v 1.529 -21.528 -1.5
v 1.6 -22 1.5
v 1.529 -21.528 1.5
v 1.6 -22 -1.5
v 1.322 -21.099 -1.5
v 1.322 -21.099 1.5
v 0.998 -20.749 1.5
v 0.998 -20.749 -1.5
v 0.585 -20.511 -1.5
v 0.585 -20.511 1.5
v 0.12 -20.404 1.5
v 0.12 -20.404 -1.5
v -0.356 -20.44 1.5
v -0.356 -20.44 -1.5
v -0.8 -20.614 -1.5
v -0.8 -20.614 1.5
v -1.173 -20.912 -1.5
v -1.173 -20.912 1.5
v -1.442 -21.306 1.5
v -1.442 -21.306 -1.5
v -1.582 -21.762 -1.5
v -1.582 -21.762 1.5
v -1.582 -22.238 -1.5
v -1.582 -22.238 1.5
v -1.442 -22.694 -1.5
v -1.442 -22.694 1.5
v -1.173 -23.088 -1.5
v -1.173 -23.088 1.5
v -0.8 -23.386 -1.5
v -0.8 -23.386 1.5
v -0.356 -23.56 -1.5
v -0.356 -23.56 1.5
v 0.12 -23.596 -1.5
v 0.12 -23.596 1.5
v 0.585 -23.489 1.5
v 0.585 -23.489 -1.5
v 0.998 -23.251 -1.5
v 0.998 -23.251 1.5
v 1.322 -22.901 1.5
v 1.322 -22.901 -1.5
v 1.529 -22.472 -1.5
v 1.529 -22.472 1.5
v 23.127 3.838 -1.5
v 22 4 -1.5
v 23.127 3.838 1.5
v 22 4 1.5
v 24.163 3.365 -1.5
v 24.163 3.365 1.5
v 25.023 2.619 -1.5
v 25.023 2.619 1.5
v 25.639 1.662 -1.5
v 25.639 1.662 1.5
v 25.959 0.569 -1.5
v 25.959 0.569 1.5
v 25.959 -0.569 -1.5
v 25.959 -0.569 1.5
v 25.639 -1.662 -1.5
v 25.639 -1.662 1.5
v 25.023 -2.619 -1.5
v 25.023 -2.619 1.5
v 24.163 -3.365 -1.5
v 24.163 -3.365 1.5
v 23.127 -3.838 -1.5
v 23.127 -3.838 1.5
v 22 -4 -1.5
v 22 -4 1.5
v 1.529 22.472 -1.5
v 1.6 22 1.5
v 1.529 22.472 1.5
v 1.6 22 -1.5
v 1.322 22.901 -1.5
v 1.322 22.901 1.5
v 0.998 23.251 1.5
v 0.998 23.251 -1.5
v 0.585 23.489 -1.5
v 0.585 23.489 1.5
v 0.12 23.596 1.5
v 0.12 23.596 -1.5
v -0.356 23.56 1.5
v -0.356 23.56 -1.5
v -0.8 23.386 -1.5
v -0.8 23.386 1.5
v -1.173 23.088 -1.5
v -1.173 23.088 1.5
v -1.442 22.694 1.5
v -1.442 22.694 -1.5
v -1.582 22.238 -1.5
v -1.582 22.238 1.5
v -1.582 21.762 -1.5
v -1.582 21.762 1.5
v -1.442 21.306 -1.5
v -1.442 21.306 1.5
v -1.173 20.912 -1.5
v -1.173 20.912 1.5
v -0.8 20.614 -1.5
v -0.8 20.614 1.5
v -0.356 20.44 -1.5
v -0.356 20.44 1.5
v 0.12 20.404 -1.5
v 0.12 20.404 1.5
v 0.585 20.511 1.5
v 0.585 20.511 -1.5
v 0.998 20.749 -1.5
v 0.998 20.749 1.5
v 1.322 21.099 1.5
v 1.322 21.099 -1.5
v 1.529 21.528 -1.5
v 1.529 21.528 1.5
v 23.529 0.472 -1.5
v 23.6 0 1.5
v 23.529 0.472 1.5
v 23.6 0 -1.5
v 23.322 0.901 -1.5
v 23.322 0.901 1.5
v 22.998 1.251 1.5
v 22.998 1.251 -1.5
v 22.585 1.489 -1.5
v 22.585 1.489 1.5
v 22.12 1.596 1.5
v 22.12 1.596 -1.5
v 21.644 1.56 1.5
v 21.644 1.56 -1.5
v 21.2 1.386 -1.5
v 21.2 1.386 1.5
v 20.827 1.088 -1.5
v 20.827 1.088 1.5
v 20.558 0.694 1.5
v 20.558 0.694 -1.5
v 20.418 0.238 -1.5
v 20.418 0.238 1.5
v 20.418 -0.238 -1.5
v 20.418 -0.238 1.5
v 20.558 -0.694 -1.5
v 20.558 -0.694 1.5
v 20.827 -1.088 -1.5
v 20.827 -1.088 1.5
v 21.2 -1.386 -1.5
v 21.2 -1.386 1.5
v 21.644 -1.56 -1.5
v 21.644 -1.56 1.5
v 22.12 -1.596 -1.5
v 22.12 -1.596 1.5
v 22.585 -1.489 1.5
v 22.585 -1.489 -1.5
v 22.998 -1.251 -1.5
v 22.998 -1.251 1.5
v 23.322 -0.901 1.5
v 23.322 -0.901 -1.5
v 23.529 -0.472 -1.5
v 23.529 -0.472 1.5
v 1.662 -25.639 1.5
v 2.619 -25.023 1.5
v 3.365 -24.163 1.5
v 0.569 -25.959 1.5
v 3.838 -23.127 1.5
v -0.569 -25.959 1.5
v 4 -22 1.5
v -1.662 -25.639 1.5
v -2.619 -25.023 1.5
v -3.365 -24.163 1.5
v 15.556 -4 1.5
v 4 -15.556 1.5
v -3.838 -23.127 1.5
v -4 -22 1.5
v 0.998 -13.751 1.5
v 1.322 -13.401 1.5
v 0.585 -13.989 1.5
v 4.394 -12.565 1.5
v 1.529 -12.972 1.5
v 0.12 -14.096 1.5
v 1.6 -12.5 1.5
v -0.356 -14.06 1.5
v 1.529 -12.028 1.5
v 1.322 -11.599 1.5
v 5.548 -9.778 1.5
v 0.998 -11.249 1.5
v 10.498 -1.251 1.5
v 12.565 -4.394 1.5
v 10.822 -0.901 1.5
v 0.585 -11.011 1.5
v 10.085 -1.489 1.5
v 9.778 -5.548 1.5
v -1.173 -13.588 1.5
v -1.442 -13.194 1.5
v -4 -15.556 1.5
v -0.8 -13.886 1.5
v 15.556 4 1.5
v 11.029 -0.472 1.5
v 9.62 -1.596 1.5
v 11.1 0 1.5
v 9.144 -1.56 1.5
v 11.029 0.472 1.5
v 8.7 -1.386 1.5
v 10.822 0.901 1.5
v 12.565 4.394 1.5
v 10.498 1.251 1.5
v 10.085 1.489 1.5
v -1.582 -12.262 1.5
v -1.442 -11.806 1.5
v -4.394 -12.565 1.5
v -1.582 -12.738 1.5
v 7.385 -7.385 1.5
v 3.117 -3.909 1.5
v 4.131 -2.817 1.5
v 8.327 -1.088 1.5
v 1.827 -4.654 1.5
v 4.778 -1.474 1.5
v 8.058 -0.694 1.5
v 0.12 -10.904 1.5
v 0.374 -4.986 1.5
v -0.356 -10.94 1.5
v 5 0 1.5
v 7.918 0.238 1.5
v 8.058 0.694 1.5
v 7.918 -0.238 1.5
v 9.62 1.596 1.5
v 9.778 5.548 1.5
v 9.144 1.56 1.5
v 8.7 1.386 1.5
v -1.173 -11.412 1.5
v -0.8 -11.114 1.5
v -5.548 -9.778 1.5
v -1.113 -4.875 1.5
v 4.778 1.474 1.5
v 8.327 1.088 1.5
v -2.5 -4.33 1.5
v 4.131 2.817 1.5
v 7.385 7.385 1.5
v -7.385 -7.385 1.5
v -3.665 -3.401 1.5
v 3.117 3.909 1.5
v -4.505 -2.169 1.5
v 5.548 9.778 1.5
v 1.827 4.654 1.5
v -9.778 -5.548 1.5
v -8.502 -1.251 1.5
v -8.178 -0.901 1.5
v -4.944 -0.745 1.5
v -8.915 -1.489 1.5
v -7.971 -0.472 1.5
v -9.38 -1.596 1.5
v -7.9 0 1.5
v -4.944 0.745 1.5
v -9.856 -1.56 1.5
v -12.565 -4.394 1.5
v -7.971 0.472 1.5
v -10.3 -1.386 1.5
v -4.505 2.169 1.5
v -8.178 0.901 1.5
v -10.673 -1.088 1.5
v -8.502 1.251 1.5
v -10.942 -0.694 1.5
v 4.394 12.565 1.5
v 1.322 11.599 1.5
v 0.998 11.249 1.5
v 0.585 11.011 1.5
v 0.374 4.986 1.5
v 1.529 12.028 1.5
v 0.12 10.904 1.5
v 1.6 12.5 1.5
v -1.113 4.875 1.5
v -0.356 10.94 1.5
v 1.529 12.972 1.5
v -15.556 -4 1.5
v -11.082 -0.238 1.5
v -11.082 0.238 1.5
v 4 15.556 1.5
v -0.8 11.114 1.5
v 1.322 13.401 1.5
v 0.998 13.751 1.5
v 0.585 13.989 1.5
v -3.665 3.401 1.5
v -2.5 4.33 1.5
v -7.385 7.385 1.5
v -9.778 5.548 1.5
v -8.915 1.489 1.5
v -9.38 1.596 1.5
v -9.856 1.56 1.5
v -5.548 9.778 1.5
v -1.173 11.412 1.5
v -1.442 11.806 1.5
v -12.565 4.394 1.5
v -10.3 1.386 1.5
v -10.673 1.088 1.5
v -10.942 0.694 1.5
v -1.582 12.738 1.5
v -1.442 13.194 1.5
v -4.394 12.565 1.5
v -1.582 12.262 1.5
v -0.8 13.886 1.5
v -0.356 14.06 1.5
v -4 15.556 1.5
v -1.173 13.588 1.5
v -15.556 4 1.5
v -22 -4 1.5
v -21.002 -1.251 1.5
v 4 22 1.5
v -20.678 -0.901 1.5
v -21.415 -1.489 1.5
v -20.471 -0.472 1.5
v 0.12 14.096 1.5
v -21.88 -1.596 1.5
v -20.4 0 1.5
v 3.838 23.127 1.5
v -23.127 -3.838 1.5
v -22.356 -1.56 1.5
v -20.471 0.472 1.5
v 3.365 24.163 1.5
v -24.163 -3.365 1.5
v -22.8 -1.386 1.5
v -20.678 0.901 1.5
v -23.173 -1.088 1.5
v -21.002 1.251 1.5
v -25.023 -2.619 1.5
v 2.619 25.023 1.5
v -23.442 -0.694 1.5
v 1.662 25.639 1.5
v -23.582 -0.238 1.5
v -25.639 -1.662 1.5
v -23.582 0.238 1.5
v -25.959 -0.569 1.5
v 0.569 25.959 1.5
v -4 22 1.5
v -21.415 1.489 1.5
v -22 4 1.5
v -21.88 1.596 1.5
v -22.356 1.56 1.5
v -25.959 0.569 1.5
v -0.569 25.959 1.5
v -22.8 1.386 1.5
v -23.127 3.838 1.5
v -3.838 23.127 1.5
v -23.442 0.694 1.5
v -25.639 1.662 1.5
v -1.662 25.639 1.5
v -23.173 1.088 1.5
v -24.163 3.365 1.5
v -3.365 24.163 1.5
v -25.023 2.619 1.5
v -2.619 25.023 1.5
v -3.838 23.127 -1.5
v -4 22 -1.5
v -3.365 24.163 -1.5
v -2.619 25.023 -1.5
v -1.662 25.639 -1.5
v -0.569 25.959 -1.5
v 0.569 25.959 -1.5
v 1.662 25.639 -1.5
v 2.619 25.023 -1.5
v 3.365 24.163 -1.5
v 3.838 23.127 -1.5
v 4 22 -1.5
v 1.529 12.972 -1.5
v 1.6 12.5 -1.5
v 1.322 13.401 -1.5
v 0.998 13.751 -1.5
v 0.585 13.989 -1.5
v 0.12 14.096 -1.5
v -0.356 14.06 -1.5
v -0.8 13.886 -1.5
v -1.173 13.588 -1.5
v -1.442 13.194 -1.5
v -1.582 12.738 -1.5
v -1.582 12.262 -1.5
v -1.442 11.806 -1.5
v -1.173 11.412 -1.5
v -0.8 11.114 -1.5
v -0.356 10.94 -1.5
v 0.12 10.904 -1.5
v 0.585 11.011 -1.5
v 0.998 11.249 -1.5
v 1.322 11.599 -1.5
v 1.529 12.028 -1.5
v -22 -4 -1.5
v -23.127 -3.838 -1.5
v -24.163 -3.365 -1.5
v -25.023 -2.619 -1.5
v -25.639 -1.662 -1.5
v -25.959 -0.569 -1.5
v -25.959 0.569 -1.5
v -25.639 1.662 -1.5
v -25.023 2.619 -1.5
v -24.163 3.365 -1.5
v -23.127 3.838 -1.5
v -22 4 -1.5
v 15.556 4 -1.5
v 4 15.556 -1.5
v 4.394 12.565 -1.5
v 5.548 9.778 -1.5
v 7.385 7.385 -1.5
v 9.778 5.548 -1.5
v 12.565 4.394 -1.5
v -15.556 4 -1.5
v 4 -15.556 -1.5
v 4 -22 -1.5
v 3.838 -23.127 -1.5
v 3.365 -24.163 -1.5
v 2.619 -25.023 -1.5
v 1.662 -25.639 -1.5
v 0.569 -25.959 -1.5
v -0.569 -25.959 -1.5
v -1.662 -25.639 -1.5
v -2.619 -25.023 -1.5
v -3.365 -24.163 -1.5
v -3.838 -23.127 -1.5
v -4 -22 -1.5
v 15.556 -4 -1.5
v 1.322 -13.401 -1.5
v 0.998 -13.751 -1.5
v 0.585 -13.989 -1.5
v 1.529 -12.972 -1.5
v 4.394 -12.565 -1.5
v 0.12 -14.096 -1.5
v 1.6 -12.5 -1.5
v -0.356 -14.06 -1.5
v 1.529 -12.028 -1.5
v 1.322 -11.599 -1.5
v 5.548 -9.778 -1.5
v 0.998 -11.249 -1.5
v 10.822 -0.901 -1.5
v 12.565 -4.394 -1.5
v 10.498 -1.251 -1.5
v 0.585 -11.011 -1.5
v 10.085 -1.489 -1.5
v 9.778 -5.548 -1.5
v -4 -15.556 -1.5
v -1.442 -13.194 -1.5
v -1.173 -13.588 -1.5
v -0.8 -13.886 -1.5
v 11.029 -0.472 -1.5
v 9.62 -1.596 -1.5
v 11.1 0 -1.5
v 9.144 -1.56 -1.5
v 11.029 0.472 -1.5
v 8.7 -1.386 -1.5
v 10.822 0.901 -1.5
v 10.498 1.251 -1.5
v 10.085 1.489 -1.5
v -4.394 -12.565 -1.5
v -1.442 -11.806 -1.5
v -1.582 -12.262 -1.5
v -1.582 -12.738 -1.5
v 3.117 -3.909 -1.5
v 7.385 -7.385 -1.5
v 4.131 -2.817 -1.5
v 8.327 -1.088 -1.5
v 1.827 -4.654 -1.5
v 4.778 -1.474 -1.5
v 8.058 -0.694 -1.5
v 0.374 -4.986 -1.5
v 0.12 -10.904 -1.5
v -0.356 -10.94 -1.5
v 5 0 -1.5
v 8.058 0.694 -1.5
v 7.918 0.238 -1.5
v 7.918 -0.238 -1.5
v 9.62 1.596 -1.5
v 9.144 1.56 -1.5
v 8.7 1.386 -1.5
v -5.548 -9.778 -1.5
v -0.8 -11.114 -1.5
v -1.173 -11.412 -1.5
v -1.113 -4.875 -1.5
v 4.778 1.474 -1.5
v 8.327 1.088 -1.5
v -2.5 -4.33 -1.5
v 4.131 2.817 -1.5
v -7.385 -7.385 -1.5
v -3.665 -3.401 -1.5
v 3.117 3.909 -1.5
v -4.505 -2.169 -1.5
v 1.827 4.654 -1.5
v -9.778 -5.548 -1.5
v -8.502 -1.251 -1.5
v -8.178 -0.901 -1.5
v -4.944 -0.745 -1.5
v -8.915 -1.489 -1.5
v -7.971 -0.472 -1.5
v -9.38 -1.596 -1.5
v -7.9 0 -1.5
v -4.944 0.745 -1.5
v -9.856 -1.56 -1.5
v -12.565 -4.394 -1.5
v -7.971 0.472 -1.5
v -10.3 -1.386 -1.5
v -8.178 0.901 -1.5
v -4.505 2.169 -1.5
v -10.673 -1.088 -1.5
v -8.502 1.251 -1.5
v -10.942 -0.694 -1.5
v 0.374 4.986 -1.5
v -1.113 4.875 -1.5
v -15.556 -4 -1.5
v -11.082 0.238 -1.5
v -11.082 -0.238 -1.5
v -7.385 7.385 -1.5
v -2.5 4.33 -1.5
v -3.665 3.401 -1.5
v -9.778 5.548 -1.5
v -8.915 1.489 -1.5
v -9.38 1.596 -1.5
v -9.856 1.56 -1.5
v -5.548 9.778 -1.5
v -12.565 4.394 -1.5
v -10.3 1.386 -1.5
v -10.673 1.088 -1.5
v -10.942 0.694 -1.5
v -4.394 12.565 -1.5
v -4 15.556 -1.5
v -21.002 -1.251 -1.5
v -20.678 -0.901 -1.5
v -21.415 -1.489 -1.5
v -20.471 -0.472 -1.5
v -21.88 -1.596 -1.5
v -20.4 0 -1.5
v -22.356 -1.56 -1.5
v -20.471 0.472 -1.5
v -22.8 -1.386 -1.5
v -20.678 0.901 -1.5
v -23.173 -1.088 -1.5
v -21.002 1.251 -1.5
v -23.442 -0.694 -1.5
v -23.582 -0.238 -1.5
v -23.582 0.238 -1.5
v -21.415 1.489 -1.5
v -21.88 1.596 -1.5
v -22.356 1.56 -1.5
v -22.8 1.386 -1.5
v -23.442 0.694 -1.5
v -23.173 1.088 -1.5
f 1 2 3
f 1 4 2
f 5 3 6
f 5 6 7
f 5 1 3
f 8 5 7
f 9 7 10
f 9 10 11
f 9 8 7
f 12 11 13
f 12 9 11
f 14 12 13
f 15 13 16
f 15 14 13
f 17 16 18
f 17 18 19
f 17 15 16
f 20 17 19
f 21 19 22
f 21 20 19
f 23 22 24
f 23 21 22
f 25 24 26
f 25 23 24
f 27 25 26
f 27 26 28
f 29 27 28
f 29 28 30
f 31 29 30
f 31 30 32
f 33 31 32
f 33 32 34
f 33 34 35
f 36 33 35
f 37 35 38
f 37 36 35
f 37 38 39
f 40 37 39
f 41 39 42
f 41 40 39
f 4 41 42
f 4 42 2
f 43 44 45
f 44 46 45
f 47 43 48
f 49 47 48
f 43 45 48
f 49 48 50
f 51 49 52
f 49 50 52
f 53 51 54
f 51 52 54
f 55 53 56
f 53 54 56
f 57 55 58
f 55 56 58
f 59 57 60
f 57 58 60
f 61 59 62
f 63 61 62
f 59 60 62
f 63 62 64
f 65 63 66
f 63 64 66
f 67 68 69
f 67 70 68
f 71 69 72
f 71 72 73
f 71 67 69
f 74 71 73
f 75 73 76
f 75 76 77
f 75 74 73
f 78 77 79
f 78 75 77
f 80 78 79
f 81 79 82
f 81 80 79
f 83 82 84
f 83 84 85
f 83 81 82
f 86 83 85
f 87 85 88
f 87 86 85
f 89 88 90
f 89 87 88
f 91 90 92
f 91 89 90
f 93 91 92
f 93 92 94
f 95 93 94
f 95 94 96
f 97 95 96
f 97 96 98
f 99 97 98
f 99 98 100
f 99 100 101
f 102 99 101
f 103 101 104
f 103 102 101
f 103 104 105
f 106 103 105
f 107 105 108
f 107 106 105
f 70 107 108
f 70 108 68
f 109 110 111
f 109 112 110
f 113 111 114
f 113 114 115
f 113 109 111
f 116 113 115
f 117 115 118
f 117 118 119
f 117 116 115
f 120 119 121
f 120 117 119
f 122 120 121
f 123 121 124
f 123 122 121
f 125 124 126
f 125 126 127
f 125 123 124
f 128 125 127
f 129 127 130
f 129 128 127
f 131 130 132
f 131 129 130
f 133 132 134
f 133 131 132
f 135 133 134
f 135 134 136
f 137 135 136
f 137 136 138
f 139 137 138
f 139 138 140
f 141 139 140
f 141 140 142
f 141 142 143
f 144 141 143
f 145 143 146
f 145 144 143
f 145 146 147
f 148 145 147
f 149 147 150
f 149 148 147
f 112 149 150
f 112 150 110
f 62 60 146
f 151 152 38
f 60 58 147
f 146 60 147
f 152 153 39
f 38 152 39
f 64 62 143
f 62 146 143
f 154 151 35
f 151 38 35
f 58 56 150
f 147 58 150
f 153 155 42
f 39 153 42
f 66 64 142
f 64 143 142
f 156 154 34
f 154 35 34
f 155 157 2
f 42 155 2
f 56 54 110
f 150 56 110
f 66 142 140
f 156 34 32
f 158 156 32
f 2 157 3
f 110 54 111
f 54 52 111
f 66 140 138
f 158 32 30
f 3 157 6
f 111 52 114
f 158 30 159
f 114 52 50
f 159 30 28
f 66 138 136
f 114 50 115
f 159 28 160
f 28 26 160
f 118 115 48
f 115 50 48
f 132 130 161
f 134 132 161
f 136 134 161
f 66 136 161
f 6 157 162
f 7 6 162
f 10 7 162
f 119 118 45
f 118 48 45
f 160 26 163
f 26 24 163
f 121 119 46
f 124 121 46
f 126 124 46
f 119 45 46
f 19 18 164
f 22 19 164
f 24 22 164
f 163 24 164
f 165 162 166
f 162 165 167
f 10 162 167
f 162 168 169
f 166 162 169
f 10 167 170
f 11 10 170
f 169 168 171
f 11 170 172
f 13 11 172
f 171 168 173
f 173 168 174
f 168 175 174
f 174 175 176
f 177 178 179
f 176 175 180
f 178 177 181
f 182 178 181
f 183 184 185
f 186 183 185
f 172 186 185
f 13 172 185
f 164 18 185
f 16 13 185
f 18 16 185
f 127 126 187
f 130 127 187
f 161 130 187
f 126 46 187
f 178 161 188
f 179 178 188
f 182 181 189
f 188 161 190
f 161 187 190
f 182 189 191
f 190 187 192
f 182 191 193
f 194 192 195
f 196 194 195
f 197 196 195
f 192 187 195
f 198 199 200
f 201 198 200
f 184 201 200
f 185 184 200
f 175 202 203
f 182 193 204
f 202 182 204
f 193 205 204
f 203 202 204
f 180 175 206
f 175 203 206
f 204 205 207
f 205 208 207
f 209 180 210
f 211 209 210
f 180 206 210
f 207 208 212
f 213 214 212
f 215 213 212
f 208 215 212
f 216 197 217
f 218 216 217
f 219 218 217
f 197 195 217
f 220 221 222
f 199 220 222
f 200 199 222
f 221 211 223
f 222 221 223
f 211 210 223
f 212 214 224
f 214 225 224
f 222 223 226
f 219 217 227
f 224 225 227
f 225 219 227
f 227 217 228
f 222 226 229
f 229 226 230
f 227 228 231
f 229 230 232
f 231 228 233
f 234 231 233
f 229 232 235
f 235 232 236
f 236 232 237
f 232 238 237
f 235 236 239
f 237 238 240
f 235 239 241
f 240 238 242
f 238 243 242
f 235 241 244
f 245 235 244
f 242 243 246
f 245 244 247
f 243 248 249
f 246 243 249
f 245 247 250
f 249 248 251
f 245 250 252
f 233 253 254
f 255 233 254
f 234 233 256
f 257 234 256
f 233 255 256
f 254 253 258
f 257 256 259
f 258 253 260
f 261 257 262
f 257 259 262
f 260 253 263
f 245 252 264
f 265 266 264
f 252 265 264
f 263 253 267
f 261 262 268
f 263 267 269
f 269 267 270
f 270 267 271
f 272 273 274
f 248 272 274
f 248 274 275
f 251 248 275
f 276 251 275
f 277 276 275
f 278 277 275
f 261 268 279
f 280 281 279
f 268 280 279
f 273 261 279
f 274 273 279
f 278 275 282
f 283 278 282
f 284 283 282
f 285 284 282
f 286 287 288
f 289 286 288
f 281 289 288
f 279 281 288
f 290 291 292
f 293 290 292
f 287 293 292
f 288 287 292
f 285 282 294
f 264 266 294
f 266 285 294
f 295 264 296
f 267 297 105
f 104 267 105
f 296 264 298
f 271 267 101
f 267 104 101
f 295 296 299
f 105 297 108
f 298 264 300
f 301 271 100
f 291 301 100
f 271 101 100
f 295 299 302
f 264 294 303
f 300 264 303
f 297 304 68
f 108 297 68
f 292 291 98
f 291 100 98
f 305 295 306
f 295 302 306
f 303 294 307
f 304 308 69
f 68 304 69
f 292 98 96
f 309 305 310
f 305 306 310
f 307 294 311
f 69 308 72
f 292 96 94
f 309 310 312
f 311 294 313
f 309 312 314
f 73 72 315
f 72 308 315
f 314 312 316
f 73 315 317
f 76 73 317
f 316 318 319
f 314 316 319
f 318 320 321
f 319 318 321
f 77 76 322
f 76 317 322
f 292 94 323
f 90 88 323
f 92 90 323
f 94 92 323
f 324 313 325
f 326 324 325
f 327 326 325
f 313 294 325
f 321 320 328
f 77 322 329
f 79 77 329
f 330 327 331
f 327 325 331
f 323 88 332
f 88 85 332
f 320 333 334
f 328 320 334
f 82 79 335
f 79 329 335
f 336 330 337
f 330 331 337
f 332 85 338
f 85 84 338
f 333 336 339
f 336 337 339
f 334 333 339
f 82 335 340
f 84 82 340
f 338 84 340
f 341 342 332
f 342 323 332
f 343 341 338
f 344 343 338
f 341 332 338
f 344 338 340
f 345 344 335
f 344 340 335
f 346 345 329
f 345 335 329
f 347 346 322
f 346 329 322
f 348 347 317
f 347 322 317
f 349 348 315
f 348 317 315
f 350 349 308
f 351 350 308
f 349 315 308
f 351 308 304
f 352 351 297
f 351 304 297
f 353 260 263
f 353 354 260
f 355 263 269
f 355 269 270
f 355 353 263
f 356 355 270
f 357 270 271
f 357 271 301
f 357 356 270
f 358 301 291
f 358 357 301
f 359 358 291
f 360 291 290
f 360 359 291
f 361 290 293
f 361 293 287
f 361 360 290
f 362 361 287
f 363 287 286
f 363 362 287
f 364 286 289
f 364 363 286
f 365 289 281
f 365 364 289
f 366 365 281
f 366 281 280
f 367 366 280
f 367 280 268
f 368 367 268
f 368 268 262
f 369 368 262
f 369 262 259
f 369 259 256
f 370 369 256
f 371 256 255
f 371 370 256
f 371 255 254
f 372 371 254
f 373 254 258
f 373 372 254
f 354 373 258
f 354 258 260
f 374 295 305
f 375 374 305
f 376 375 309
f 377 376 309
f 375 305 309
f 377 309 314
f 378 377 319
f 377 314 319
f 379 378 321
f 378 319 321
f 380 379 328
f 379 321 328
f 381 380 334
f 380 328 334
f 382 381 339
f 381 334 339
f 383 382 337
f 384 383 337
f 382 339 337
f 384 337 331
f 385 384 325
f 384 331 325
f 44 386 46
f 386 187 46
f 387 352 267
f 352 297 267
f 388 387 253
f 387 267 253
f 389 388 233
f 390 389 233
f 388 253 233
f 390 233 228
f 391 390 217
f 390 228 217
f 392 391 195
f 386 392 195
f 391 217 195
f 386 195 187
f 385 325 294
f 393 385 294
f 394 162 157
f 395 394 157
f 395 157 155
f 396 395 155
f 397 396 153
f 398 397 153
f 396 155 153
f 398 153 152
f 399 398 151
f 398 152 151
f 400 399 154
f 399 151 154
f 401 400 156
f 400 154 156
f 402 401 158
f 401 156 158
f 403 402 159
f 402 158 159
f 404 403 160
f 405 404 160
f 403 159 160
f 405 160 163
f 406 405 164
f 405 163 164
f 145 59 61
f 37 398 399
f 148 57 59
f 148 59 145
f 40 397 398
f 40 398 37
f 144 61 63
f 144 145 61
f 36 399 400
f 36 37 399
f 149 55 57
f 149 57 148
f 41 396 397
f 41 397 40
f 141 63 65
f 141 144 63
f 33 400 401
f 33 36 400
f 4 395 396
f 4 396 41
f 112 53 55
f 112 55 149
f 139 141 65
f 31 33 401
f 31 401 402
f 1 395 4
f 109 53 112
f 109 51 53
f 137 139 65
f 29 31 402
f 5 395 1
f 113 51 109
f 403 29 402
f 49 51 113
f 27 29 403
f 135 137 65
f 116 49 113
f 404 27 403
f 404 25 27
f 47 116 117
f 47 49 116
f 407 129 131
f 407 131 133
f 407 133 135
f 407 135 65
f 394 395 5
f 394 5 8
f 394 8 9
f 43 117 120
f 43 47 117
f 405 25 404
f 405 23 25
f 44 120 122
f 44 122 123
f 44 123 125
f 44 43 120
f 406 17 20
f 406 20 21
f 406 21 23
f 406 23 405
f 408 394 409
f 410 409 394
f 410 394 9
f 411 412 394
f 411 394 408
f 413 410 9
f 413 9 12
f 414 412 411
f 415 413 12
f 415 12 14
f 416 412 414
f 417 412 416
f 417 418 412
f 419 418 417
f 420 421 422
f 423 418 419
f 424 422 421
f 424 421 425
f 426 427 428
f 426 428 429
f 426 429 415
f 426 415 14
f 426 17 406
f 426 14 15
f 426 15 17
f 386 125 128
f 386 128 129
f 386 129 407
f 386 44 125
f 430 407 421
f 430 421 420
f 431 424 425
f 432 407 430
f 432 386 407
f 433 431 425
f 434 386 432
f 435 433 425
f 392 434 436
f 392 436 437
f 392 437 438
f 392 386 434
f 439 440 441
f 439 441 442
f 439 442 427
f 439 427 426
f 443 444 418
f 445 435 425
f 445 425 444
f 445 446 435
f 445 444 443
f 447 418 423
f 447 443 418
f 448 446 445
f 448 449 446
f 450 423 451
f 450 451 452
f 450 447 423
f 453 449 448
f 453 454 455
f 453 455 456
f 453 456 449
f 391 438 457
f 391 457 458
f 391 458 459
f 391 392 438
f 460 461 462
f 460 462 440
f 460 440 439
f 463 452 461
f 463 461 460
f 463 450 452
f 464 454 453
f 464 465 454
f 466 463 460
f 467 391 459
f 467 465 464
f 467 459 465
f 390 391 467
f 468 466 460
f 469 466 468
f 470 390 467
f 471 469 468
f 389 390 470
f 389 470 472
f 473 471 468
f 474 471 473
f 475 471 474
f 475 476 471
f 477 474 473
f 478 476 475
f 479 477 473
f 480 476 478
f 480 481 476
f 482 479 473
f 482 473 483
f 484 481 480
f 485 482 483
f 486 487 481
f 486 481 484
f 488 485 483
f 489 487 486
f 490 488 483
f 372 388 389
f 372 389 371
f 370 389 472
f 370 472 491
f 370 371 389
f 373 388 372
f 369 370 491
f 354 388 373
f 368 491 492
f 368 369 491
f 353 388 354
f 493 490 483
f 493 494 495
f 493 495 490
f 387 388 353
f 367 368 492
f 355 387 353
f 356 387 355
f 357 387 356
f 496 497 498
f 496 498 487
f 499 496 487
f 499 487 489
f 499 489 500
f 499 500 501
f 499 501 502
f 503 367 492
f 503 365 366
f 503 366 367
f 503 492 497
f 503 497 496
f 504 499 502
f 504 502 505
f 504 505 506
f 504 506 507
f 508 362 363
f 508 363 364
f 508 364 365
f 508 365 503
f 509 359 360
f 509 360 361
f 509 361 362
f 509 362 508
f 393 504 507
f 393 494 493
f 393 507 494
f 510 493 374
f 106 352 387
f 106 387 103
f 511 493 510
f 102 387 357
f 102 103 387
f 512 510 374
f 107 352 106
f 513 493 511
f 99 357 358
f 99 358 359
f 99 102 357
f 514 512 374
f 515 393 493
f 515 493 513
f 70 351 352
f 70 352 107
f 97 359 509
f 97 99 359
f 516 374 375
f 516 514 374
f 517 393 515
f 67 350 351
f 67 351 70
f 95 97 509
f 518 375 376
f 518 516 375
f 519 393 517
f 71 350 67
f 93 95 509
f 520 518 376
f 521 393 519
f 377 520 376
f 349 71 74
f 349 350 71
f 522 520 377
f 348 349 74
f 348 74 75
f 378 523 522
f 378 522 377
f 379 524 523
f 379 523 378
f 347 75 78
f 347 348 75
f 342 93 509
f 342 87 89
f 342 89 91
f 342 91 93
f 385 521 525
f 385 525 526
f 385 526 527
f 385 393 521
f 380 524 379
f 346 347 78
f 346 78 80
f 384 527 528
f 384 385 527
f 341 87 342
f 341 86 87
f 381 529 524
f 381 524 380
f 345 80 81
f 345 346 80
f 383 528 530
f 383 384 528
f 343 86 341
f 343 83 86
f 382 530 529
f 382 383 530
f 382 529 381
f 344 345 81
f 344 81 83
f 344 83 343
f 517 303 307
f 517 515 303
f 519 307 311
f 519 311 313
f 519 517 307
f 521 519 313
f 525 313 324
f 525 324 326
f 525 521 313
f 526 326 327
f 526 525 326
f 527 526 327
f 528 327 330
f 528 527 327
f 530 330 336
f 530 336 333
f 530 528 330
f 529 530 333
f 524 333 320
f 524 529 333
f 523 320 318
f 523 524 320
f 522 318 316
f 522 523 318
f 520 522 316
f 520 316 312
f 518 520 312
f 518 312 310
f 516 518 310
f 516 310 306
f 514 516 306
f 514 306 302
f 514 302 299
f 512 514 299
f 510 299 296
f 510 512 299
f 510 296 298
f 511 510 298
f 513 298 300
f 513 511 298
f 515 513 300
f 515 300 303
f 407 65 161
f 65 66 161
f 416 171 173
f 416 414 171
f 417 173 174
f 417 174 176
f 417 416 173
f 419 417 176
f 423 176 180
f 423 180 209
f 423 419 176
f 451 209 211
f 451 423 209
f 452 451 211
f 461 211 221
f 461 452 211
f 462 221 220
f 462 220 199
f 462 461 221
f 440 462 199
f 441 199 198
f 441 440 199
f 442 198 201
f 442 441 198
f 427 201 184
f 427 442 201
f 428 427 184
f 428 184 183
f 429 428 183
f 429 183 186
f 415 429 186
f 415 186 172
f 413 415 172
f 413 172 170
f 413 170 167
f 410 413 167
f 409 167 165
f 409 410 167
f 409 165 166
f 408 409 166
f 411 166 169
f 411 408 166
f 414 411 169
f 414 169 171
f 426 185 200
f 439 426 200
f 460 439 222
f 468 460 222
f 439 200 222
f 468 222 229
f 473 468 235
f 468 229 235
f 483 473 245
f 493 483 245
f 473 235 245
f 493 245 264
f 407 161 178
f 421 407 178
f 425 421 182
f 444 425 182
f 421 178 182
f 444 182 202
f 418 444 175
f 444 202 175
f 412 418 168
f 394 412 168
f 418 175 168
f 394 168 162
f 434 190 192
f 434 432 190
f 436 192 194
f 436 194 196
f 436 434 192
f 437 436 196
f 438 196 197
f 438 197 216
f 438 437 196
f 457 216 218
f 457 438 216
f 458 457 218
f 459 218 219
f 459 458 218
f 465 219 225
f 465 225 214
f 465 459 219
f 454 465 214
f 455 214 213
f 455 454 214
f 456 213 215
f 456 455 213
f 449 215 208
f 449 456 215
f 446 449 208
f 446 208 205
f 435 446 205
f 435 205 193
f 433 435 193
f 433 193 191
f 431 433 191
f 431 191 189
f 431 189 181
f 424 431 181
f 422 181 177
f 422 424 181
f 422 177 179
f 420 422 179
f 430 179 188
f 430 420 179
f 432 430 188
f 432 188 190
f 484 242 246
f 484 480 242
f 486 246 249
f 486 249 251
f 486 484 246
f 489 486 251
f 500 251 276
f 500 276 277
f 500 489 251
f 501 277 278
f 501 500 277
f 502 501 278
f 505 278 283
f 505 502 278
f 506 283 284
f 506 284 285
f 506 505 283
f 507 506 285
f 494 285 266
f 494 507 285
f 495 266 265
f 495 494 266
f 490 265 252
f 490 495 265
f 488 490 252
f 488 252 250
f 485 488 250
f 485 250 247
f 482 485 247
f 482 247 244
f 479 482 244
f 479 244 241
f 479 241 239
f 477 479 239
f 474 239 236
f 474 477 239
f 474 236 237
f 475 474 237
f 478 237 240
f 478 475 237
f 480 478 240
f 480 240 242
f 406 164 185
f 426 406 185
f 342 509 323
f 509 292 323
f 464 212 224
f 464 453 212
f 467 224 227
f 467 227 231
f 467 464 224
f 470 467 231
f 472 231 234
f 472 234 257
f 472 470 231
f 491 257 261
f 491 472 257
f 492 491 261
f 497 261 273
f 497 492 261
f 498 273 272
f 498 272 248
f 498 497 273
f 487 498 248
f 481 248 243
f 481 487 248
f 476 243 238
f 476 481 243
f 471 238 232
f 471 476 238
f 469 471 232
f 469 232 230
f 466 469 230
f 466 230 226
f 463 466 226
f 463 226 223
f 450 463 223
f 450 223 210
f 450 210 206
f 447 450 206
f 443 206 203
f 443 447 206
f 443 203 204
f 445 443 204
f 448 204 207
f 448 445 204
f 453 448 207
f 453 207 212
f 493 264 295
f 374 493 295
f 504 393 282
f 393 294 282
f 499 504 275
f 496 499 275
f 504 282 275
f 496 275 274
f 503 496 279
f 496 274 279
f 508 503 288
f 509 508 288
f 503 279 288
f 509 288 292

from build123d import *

# Parameters (mm, degrees)
SKETCH_1_R      = 1.6
SKETCH_1_R_2    = 5
EXTRUDE_1_DEPTH = 1.5


with BuildPart() as part:
    # Эскиз1 → Бобышка-Вытянуть1 (new, symmetric)
    with BuildSketch(Plane.XY):
        with BuildLine():
            Line((-22, 4), (-15.556349186, 4))
            ThreePointArc((-15.556349186, 4), (-7.384776311, 7.384776311), (-4, 15.556349186))
            Line((-4, 15.556349186), (-4, 22))
            ThreePointArc((-4, 22), (0, 26), (4, 22))
            Line((4, 22), (4, 15.556349186))
            ThreePointArc((4, 15.556349186), (7.384776311, 7.384776311), (15.556349186, 4))
            Line((15.556349186, 4), (22, 4))
            ThreePointArc((22, 4), (26, 0), (22, -4))
            Line((22, -4), (15.556349186, -4))
            ThreePointArc((15.556349186, -4), (7.384776311, -7.384776311), (4, -15.556349186))
            Line((4, -15.556349186), (4, -22))
            ThreePointArc((4, -22), (0, -26), (-4, -22))
            Line((-4, -22), (-4, -15.556349186))
            ThreePointArc((-4, -15.556349186), (-7.384776311, -7.384776311), (-15.556349186, -4))
            Line((-15.556349186, -4), (-22, -4))
            ThreePointArc((-22, -4), (-26, 0), (-22, 4))
        make_face()
        with Locations((0, 22)):
            Circle(SKETCH_1_R, mode=Mode.SUBTRACT)
        with Locations((22, 0)):
            Circle(SKETCH_1_R, mode=Mode.SUBTRACT)
        with Locations((0, -22)):
            Circle(SKETCH_1_R, mode=Mode.SUBTRACT)
        with Locations((-22, 0)):
            Circle(SKETCH_1_R, mode=Mode.SUBTRACT)
        Circle(SKETCH_1_R_2, mode=Mode.SUBTRACT)
        with Locations((-9.5, 0)):
            Circle(SKETCH_1_R, mode=Mode.SUBTRACT)
        with Locations((9.5, 0)):
            Circle(SKETCH_1_R, mode=Mode.SUBTRACT)
        with Locations((0, 12.5)):
            Circle(SKETCH_1_R, mode=Mode.SUBTRACT)
        with Locations((0, -12.5)):
            Circle(SKETCH_1_R, mode=Mode.SUBTRACT)
    extrude(amount=EXTRUDE_1_DEPTH, both=True)


solid = part.part
